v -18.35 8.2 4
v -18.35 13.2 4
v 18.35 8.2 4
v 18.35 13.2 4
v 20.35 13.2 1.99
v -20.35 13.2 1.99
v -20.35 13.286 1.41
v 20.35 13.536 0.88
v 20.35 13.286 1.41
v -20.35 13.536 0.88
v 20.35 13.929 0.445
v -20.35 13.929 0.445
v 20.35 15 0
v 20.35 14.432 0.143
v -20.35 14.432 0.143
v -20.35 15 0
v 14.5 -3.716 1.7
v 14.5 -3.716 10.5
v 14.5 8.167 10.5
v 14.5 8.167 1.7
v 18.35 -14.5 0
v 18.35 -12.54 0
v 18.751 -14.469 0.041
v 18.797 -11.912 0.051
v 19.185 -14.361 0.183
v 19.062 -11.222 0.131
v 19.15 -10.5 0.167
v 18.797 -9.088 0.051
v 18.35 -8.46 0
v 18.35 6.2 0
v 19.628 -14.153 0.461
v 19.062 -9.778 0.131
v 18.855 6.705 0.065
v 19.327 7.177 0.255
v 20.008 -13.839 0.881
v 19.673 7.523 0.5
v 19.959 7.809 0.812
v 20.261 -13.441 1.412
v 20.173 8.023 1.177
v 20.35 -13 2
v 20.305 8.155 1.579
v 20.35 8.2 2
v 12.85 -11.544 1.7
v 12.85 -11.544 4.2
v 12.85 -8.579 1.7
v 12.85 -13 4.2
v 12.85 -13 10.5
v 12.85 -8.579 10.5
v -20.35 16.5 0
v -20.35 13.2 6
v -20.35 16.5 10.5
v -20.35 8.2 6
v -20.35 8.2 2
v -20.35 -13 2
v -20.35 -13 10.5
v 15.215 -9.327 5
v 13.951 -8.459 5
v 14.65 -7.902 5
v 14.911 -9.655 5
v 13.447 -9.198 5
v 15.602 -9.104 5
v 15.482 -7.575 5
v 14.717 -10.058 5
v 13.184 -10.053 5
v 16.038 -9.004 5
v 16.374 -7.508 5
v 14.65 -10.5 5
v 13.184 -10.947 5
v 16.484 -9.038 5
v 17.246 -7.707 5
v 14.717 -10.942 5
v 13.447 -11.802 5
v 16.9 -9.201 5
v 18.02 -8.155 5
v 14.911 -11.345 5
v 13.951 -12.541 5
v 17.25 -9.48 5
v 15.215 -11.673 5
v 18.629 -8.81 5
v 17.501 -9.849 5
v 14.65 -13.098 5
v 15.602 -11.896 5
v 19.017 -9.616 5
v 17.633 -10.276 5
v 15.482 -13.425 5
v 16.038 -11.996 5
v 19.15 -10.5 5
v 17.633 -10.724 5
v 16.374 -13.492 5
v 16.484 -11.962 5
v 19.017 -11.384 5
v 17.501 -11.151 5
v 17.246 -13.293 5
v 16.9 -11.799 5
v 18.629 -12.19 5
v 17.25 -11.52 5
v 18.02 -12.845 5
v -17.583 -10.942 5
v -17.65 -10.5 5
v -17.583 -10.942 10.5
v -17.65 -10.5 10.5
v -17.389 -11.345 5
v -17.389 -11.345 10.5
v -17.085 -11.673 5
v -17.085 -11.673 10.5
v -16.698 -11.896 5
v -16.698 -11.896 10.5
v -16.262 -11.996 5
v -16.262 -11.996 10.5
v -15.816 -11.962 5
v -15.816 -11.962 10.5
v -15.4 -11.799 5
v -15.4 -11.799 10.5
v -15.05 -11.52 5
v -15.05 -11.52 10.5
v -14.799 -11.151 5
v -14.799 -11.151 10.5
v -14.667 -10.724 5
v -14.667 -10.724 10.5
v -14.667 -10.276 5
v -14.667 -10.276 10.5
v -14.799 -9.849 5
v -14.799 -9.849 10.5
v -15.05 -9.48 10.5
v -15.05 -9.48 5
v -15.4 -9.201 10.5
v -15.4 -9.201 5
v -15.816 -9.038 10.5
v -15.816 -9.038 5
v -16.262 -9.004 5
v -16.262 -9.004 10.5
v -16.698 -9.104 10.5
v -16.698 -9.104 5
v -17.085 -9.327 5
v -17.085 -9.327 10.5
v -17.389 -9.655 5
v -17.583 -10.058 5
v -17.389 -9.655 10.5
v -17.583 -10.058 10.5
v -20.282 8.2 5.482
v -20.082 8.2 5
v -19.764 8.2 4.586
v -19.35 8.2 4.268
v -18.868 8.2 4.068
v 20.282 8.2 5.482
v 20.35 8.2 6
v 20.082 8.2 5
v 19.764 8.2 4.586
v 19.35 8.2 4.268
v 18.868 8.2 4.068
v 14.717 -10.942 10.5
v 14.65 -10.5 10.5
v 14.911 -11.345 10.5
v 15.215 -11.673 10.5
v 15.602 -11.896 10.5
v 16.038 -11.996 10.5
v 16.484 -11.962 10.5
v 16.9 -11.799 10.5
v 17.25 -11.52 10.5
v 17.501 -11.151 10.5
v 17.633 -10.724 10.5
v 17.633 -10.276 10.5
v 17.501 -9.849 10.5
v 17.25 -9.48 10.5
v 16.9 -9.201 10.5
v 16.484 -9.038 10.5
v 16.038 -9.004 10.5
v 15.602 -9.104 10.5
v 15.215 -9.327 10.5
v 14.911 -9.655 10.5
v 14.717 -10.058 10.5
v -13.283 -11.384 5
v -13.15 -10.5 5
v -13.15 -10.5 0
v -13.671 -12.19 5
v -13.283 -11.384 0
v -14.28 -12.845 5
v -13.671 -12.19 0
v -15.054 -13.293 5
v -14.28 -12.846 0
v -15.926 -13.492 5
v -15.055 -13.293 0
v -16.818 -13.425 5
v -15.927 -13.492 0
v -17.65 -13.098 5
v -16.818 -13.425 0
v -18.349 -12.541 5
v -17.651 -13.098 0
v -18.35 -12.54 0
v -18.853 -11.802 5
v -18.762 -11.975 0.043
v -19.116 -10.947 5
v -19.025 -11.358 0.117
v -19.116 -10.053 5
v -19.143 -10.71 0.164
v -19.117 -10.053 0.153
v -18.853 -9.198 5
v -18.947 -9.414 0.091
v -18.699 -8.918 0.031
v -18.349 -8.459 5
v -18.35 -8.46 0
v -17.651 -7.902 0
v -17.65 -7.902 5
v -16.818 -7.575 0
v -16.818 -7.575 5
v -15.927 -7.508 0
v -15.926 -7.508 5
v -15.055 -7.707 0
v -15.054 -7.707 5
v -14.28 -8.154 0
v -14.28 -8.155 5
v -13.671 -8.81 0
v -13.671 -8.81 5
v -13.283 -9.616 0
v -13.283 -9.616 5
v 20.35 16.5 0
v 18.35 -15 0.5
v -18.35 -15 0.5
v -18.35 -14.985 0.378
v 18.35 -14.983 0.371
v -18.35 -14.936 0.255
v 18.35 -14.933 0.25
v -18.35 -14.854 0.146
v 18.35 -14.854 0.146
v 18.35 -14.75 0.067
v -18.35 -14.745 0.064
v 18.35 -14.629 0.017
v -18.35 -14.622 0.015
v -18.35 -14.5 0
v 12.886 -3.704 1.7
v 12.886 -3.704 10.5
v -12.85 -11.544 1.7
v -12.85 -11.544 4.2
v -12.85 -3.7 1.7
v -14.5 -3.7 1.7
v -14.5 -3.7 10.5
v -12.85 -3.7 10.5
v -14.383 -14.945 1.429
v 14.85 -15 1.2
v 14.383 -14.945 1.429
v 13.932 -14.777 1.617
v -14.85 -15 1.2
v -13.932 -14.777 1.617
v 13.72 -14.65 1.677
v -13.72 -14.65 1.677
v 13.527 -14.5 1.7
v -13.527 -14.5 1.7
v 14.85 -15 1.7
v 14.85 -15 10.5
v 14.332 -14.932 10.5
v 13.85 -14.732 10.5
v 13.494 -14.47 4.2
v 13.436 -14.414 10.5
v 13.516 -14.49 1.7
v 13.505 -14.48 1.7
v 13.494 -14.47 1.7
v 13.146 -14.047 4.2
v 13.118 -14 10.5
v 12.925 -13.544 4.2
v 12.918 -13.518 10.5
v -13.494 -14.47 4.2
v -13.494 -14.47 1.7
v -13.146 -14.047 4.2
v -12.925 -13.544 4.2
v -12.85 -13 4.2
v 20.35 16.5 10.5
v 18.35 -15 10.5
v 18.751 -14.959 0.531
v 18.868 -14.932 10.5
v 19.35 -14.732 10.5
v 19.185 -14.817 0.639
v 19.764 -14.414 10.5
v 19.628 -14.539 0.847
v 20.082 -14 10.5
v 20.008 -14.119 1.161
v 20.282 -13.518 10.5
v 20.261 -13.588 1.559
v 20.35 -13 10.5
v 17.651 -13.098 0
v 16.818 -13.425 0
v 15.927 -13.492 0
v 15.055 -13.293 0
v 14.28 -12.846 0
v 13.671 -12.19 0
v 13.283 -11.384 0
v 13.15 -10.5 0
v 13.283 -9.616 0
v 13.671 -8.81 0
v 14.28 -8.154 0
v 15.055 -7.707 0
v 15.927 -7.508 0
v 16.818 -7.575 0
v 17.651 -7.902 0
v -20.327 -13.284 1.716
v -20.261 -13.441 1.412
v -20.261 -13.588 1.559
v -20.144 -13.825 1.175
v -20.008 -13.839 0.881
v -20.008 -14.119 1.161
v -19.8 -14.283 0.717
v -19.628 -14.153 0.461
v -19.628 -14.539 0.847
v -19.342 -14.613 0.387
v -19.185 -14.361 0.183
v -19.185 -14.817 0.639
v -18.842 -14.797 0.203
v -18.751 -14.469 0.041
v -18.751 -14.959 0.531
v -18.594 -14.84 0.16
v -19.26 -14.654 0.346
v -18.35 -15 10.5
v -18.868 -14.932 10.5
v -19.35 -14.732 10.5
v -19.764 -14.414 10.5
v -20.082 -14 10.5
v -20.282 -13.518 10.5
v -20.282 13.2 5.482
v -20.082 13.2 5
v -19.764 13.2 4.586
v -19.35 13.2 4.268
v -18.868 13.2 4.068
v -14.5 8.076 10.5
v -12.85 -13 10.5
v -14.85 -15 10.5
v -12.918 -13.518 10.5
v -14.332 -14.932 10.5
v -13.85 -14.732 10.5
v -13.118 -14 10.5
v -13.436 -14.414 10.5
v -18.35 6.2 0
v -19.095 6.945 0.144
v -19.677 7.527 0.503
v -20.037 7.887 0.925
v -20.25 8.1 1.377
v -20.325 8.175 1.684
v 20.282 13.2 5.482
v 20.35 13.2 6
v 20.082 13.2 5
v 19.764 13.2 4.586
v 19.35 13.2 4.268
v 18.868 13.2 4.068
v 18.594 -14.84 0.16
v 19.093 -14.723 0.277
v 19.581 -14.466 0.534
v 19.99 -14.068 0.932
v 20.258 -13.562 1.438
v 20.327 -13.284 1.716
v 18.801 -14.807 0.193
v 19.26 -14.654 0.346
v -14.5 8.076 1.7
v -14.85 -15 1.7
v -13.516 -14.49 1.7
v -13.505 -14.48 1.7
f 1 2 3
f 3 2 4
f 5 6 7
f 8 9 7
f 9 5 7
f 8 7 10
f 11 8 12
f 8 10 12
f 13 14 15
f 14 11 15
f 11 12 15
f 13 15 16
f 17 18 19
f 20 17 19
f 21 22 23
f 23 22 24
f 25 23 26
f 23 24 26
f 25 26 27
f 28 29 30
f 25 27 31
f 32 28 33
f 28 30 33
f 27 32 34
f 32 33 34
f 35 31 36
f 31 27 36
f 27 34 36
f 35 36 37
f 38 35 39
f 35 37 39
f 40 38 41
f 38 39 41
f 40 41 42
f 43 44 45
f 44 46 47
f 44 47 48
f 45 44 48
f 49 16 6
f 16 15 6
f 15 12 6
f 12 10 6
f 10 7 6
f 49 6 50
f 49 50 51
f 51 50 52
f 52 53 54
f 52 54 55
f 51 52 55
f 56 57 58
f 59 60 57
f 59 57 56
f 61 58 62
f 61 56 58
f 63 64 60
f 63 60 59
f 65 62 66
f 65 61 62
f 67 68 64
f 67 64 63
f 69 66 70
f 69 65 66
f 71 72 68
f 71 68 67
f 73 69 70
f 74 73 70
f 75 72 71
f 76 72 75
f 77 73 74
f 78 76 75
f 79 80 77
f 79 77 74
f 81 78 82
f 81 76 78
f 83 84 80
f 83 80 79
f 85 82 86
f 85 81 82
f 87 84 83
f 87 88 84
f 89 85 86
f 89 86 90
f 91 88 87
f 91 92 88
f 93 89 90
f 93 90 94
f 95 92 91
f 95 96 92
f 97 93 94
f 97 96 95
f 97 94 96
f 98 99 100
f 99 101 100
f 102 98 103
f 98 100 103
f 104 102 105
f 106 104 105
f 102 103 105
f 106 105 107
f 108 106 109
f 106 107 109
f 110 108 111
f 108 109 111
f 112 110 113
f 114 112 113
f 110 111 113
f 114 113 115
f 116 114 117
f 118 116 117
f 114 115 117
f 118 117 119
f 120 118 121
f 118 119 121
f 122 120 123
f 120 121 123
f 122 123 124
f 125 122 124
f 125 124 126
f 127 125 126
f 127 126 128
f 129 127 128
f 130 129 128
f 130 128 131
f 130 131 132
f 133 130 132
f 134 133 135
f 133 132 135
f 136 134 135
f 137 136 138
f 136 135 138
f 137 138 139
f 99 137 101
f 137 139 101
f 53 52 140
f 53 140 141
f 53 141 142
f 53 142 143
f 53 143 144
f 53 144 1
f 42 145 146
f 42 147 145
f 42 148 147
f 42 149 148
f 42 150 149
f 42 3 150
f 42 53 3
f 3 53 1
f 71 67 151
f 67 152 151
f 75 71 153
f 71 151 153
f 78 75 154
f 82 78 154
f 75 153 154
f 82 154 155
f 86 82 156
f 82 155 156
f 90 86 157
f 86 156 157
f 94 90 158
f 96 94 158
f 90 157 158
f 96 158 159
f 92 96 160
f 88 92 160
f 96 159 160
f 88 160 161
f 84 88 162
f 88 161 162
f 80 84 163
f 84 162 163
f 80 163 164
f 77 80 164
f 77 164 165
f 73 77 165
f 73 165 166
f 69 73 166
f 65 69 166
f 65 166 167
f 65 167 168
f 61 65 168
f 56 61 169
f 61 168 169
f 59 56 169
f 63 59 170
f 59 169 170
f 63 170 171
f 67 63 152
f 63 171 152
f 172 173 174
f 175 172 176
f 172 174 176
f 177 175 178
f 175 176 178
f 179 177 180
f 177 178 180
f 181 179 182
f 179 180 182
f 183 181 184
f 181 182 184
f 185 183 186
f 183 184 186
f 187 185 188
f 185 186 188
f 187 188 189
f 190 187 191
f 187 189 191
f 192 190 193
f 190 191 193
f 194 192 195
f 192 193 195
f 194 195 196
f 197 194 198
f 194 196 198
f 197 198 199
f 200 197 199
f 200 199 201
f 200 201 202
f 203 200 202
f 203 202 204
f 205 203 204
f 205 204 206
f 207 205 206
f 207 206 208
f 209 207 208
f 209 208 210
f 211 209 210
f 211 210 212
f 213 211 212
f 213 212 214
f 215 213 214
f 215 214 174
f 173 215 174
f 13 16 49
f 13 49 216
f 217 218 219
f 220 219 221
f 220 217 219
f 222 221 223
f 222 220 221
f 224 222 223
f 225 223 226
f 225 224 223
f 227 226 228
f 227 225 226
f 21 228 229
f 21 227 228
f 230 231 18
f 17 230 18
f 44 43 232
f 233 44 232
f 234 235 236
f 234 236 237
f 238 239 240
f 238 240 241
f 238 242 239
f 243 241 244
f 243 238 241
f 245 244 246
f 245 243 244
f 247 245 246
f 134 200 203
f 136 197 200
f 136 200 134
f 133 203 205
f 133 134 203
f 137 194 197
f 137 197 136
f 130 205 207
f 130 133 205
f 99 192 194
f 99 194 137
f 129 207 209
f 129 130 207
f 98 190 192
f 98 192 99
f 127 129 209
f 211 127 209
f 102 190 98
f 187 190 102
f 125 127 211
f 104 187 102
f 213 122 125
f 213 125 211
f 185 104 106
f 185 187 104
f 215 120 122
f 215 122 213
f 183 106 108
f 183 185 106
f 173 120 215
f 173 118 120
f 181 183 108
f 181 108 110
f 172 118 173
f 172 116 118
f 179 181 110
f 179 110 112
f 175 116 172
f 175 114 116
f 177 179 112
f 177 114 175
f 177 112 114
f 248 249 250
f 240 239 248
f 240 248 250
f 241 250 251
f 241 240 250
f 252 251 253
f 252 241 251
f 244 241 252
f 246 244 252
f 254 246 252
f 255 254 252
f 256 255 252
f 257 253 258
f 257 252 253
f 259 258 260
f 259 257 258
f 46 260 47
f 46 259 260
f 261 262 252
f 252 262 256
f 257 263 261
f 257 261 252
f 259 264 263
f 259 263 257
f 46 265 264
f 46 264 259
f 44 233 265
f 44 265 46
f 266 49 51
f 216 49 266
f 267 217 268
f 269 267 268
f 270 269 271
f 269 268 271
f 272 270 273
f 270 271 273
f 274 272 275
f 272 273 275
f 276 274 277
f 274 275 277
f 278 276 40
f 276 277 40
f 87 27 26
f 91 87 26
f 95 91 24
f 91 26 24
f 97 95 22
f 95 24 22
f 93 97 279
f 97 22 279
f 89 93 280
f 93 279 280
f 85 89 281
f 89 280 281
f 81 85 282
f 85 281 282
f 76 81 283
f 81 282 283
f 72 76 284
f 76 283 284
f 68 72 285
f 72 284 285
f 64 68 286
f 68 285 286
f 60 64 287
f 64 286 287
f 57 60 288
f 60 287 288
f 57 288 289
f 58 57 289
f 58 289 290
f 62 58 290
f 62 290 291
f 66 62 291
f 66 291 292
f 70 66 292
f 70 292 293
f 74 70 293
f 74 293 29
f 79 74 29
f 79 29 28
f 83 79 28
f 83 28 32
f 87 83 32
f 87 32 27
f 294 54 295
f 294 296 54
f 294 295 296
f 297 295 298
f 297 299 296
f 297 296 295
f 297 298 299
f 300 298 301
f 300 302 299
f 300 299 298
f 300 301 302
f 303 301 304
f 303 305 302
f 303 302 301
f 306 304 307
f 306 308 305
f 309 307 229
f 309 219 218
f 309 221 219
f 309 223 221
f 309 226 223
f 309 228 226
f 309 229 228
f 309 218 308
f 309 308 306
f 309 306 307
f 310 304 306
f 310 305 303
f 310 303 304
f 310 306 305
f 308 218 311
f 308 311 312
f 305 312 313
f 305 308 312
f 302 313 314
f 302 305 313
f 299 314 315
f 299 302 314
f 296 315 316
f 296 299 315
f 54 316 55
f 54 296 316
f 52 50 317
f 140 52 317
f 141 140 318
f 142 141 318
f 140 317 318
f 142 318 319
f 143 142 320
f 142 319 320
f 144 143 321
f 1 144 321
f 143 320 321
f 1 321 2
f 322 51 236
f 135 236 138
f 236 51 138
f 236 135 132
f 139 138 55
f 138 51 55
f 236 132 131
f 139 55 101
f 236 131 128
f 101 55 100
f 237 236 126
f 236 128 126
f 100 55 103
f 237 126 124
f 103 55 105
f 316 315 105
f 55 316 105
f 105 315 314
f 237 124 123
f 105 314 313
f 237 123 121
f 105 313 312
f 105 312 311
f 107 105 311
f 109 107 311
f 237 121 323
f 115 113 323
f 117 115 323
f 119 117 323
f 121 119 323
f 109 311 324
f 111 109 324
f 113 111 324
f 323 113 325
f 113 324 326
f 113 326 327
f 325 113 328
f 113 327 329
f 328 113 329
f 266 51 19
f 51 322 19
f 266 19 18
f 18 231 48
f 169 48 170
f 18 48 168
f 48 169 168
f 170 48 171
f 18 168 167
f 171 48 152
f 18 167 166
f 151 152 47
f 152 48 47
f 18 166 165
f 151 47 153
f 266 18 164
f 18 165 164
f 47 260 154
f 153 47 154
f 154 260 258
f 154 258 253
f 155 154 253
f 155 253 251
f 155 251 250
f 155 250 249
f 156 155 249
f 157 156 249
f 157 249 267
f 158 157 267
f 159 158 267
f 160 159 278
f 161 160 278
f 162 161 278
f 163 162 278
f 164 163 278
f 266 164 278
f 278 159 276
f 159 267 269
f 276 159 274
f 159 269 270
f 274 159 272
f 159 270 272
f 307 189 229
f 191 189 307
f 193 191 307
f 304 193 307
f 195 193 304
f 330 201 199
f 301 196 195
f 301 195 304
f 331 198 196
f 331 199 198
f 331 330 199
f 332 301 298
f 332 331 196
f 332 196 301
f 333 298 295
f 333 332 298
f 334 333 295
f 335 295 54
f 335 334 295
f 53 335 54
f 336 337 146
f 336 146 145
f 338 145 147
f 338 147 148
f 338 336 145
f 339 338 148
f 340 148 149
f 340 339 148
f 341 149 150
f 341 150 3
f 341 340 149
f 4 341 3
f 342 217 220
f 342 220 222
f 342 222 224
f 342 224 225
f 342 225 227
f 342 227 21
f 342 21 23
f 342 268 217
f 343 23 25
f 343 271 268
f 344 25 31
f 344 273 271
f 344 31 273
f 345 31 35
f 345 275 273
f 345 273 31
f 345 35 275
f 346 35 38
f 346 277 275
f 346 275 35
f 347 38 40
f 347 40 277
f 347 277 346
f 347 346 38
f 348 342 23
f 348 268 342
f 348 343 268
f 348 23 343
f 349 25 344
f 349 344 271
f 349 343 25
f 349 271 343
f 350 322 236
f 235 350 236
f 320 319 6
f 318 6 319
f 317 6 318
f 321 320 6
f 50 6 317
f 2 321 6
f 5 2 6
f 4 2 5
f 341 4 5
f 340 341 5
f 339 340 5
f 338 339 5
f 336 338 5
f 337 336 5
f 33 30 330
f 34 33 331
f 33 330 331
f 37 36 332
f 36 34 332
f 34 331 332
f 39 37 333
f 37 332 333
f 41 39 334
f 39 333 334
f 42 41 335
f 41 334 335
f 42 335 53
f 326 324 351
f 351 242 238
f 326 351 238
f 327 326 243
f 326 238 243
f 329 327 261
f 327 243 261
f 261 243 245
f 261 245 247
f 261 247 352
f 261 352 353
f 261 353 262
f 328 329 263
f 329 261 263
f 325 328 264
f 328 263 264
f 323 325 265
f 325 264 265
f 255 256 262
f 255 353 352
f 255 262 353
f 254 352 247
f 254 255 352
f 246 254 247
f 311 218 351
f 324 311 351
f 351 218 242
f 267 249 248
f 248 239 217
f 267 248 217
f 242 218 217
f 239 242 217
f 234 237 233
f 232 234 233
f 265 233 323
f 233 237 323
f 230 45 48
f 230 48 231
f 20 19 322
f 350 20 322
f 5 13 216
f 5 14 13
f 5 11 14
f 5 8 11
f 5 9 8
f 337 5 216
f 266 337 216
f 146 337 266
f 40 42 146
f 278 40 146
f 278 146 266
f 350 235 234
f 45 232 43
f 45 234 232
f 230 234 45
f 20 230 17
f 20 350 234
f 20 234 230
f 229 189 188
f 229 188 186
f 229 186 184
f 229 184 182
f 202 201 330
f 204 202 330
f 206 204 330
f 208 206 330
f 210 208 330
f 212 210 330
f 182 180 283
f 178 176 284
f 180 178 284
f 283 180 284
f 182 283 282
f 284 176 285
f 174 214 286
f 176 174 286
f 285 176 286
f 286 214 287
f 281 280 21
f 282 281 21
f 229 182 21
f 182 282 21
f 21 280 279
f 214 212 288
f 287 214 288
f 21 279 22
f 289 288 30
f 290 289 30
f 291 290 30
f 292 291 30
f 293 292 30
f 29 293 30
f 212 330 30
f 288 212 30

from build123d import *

# Parameters (mm, degrees)
F0_W           = 40.7
F0_H           = 23.2
F0_H_2         = 5
F0_H_3         = 1.8
F1_DEPTH       = 10.5
F2_D           = 3
F2_CBORE_D     = 6
F2_CBORE_DEPTH = 5
F3_D           = 3
F3_CBORE_D     = 6
F3_CBORE_DEPTH = 5
F4_DEPTH       = 4
F6_DEPTH       = 8.8
F7_T1_DEPTH    = 13.8
F7_T3_DEPTH    = 20.5
F7_T5_DEPTH    = 33.2
F7_T7_DEPTH    = 50.6498743711
F7_T9_DEPTH    = 50.7
F7_T11_DEPTH   = 5
F8_R           = 0.5
F10_DEPTH      = 2.5
F11_DEPTH      = 1.5


# Not quite as in the source:
# - a fillet or chamfer that OpenCascade refuses, or shapes differently, is made with other operations: its cross-section is extruded or revolved along the edge and cut away or added


with BuildPart() as f1:
    # F0 (on Top) → F1 (new body)
    with BuildSketch(Plane.XY):
        with Locations((0, -3.4)):
            Rectangle(F0_W, F0_H)
        with Locations((0, 10.7)):
            Rectangle(F0_W, F0_H_2)
        with Locations((0, 14.1)):
            Rectangle(F0_W, F0_H_3)
    extrude(amount=F1_DEPTH)

    # F2 (through all)
    with Locations(Plane(origin=(0, 0, 0), x_dir=(1, 0, 0), z_dir=(0, 0, -1))):
        with Locations((-16.15, 10.5)):
            CounterBoreHole(F2_D / 2, F2_CBORE_D / 2, F2_CBORE_DEPTH)

    # F3 (through all)
    with Locations(Plane(origin=(0, 0, 0), x_dir=(1, 0, 0), z_dir=(0, 0, -1))):
        with Locations((16.15, 10.5)):
            CounterBoreHole(F3_D / 2, F3_CBORE_D / 2, F3_CBORE_DEPTH)

    # F0 (on Top) → F4 (cut)
    with BuildSketch(Plane.XY):
        with Locations((0, 10.7)):
            Rectangle(F0_W, F0_H_2)
    extrude(amount=F4_DEPTH, mode=Mode.SUBTRACT)

    # F5 (on face) → F6 (cut)
    with BuildSketch(Plane.XY.offset(10.5)):
        Polygon((-12.85, -3.7), (-12.85, -8.6720474064), (-12.85, -15), (12.85, -15), (12.85, -8.5788490251), (12.886153895, -3.7037077804), (14.5, -3.7156760127), (14.5, 8.1671951339), (-14.5, 8.0755921081), (-14.5, -3.7), align=None)
    extrude(amount=-F6_DEPTH, mode=Mode.SUBTRACT)

    # F7: fillet of radius 2 on 10 edges, made by hand

    # F7_s2 → F7_t1 (cut)
    with BuildSketch(Plane.XY.offset(1.7)):
        with BuildLine():
            ThreePointArc((-14.85, -15), (-13.4357864376, -14.4142135624), (-12.85, -13))
            Line((-12.85, -13), (-12.85, -15))
            Line((-12.85, -15), (-14.85, -15))
        make_face()
        with BuildLine():
            ThreePointArc((14.85, -15), (13.4357864376, -14.4142135624), (12.85, -13))
            Line((12.85, -13), (12.85, -15))
            Line((12.85, -15), (14.85, -15))
        make_face()
    extrude(amount=F7_T1_DEPTH, mode=Mode.SUBTRACT)

    # F7_s4 → F7_t3 (cut)
    with BuildSketch(Plane.XY.offset(-5)):
        with BuildLine():
            ThreePointArc((-18.35, -15), (-19.7642135624, -14.4142135624), (-20.35, -13))
            Line((-20.35, -13), (-20.35, -15))
            Line((-20.35, -15), (-18.35, -15))
        make_face()
        with BuildLine():
            ThreePointArc((18.35, -15), (19.7642135624, -14.4142135624), (20.35, -13))
            Line((20.35, -13), (20.35, -15))
            Line((20.35, -15), (18.35, -15))
        make_face()
    extrude(amount=F7_T3_DEPTH, mode=Mode.SUBTRACT)

    # F7_s6 → F7_t5 (cut)
    with BuildSketch(Plane.XZ.offset(-13.2)):
        with BuildLine():
            ThreePointArc((-18.35, 0), (-19.7642135624, 0.5857864376), (-20.35, 2))
            Line((-20.35, 2), (-20.35, 0))
            Line((-20.35, 0), (-18.35, 0))
        make_face()
        with BuildLine():
            ThreePointArc((18.35, 0), (19.7642135624, 0.5857864376), (20.35, 2))
            Line((20.35, 2), (20.35, 0))
            Line((20.35, 0), (18.35, 0))
        make_face()
    extrude(amount=F7_T5_DEPTH, mode=Mode.SUBTRACT)

    # F7_s8 → F7_t7 (cut)
    with BuildSketch(Plane.YZ.offset(-25.3249371855)):
        with BuildLine():
            ThreePointArc((13.2, 1.9899748742), (13.7167603026, 0.6483340877), (15, 0))
            Line((15, 0), (13.2, 0))
            Line((13.2, 0), (13.2, 1.9899748742))
        make_face()
    extrude(amount=F7_T7_DEPTH, mode=Mode.SUBTRACT)

    # F7_s10 → F7_t9 (cut)
    with BuildSketch(Plane.YZ.offset(-25.35)):
        with BuildLine():
            ThreePointArc((6.2, 0), (7.6142135624, 0.5857864376), (8.2, 2))
            Line((8.2, 2), (8.2, 0))
            Line((8.2, 0), (6.2, 0))
        make_face()
    extrude(amount=F7_T9_DEPTH, mode=Mode.SUBTRACT)

    # F7_s12 → F7_t11 (cut)
    with BuildSketch(Plane.XZ.offset(-13.2)):
        with BuildLine():
            ThreePointArc((20.35, 6), (19.7642135624, 4.5857864376), (18.35, 4))
            Line((18.35, 4), (20.35, 4))
            Line((20.35, 4), (20.35, 6))
        make_face()
        with BuildLine():
            ThreePointArc((-20.35, 6), (-19.7642135624, 4.5857864376), (-18.35, 4))
            Line((-18.35, 4), (-20.35, 4))
            Line((-20.35, 4), (-20.35, 6))
        make_face()
    extrude(amount=F7_T11_DEPTH, mode=Mode.SUBTRACT)

    # F8
    f8_edges = [f1.edges().sort_by_distance(p)[0] for p in [
        (0, -15, 0),
        (0, -15, 1.7),
        (-19.764214, -14.414214, 0.585786),
        (19.764214, -14.414214, 0.585786),
    ]]
    fillet(f8_edges, radius=F8_R)

    # F9 (on face) → F10 (join)
    with BuildSketch(Plane.XY.offset(1.7)):
        with BuildLine():
            Line((12.85, -11.5439696237), (-12.85, -11.5439696237))
            Line((-12.85, -11.5439696237), (-12.85, -13))
            ThreePointArc((-12.85, -13), (-13.0181614416, -13.802725044), (-13.4943674962, -14.4704626873))
            Line((-13.4943674962, -14.4704626873), (13.4943674962, -14.4704626873))
            ThreePointArc((13.4943674962, -14.4704626873), (13.0181614416, -13.802725044), (12.85, -13))
            Line((12.85, -13), (12.85, -11.5439696237))
        make_face()
    extrude(amount=F10_DEPTH)

    # F11 (add): a face of the model
    f11_faces = [f1.faces().sort_by_distance(p)[0] for p in [
        (0, 15, 5.25),
    ]]
    extrude(f11_faces, amount=F11_DEPTH)


solid = f1.part
